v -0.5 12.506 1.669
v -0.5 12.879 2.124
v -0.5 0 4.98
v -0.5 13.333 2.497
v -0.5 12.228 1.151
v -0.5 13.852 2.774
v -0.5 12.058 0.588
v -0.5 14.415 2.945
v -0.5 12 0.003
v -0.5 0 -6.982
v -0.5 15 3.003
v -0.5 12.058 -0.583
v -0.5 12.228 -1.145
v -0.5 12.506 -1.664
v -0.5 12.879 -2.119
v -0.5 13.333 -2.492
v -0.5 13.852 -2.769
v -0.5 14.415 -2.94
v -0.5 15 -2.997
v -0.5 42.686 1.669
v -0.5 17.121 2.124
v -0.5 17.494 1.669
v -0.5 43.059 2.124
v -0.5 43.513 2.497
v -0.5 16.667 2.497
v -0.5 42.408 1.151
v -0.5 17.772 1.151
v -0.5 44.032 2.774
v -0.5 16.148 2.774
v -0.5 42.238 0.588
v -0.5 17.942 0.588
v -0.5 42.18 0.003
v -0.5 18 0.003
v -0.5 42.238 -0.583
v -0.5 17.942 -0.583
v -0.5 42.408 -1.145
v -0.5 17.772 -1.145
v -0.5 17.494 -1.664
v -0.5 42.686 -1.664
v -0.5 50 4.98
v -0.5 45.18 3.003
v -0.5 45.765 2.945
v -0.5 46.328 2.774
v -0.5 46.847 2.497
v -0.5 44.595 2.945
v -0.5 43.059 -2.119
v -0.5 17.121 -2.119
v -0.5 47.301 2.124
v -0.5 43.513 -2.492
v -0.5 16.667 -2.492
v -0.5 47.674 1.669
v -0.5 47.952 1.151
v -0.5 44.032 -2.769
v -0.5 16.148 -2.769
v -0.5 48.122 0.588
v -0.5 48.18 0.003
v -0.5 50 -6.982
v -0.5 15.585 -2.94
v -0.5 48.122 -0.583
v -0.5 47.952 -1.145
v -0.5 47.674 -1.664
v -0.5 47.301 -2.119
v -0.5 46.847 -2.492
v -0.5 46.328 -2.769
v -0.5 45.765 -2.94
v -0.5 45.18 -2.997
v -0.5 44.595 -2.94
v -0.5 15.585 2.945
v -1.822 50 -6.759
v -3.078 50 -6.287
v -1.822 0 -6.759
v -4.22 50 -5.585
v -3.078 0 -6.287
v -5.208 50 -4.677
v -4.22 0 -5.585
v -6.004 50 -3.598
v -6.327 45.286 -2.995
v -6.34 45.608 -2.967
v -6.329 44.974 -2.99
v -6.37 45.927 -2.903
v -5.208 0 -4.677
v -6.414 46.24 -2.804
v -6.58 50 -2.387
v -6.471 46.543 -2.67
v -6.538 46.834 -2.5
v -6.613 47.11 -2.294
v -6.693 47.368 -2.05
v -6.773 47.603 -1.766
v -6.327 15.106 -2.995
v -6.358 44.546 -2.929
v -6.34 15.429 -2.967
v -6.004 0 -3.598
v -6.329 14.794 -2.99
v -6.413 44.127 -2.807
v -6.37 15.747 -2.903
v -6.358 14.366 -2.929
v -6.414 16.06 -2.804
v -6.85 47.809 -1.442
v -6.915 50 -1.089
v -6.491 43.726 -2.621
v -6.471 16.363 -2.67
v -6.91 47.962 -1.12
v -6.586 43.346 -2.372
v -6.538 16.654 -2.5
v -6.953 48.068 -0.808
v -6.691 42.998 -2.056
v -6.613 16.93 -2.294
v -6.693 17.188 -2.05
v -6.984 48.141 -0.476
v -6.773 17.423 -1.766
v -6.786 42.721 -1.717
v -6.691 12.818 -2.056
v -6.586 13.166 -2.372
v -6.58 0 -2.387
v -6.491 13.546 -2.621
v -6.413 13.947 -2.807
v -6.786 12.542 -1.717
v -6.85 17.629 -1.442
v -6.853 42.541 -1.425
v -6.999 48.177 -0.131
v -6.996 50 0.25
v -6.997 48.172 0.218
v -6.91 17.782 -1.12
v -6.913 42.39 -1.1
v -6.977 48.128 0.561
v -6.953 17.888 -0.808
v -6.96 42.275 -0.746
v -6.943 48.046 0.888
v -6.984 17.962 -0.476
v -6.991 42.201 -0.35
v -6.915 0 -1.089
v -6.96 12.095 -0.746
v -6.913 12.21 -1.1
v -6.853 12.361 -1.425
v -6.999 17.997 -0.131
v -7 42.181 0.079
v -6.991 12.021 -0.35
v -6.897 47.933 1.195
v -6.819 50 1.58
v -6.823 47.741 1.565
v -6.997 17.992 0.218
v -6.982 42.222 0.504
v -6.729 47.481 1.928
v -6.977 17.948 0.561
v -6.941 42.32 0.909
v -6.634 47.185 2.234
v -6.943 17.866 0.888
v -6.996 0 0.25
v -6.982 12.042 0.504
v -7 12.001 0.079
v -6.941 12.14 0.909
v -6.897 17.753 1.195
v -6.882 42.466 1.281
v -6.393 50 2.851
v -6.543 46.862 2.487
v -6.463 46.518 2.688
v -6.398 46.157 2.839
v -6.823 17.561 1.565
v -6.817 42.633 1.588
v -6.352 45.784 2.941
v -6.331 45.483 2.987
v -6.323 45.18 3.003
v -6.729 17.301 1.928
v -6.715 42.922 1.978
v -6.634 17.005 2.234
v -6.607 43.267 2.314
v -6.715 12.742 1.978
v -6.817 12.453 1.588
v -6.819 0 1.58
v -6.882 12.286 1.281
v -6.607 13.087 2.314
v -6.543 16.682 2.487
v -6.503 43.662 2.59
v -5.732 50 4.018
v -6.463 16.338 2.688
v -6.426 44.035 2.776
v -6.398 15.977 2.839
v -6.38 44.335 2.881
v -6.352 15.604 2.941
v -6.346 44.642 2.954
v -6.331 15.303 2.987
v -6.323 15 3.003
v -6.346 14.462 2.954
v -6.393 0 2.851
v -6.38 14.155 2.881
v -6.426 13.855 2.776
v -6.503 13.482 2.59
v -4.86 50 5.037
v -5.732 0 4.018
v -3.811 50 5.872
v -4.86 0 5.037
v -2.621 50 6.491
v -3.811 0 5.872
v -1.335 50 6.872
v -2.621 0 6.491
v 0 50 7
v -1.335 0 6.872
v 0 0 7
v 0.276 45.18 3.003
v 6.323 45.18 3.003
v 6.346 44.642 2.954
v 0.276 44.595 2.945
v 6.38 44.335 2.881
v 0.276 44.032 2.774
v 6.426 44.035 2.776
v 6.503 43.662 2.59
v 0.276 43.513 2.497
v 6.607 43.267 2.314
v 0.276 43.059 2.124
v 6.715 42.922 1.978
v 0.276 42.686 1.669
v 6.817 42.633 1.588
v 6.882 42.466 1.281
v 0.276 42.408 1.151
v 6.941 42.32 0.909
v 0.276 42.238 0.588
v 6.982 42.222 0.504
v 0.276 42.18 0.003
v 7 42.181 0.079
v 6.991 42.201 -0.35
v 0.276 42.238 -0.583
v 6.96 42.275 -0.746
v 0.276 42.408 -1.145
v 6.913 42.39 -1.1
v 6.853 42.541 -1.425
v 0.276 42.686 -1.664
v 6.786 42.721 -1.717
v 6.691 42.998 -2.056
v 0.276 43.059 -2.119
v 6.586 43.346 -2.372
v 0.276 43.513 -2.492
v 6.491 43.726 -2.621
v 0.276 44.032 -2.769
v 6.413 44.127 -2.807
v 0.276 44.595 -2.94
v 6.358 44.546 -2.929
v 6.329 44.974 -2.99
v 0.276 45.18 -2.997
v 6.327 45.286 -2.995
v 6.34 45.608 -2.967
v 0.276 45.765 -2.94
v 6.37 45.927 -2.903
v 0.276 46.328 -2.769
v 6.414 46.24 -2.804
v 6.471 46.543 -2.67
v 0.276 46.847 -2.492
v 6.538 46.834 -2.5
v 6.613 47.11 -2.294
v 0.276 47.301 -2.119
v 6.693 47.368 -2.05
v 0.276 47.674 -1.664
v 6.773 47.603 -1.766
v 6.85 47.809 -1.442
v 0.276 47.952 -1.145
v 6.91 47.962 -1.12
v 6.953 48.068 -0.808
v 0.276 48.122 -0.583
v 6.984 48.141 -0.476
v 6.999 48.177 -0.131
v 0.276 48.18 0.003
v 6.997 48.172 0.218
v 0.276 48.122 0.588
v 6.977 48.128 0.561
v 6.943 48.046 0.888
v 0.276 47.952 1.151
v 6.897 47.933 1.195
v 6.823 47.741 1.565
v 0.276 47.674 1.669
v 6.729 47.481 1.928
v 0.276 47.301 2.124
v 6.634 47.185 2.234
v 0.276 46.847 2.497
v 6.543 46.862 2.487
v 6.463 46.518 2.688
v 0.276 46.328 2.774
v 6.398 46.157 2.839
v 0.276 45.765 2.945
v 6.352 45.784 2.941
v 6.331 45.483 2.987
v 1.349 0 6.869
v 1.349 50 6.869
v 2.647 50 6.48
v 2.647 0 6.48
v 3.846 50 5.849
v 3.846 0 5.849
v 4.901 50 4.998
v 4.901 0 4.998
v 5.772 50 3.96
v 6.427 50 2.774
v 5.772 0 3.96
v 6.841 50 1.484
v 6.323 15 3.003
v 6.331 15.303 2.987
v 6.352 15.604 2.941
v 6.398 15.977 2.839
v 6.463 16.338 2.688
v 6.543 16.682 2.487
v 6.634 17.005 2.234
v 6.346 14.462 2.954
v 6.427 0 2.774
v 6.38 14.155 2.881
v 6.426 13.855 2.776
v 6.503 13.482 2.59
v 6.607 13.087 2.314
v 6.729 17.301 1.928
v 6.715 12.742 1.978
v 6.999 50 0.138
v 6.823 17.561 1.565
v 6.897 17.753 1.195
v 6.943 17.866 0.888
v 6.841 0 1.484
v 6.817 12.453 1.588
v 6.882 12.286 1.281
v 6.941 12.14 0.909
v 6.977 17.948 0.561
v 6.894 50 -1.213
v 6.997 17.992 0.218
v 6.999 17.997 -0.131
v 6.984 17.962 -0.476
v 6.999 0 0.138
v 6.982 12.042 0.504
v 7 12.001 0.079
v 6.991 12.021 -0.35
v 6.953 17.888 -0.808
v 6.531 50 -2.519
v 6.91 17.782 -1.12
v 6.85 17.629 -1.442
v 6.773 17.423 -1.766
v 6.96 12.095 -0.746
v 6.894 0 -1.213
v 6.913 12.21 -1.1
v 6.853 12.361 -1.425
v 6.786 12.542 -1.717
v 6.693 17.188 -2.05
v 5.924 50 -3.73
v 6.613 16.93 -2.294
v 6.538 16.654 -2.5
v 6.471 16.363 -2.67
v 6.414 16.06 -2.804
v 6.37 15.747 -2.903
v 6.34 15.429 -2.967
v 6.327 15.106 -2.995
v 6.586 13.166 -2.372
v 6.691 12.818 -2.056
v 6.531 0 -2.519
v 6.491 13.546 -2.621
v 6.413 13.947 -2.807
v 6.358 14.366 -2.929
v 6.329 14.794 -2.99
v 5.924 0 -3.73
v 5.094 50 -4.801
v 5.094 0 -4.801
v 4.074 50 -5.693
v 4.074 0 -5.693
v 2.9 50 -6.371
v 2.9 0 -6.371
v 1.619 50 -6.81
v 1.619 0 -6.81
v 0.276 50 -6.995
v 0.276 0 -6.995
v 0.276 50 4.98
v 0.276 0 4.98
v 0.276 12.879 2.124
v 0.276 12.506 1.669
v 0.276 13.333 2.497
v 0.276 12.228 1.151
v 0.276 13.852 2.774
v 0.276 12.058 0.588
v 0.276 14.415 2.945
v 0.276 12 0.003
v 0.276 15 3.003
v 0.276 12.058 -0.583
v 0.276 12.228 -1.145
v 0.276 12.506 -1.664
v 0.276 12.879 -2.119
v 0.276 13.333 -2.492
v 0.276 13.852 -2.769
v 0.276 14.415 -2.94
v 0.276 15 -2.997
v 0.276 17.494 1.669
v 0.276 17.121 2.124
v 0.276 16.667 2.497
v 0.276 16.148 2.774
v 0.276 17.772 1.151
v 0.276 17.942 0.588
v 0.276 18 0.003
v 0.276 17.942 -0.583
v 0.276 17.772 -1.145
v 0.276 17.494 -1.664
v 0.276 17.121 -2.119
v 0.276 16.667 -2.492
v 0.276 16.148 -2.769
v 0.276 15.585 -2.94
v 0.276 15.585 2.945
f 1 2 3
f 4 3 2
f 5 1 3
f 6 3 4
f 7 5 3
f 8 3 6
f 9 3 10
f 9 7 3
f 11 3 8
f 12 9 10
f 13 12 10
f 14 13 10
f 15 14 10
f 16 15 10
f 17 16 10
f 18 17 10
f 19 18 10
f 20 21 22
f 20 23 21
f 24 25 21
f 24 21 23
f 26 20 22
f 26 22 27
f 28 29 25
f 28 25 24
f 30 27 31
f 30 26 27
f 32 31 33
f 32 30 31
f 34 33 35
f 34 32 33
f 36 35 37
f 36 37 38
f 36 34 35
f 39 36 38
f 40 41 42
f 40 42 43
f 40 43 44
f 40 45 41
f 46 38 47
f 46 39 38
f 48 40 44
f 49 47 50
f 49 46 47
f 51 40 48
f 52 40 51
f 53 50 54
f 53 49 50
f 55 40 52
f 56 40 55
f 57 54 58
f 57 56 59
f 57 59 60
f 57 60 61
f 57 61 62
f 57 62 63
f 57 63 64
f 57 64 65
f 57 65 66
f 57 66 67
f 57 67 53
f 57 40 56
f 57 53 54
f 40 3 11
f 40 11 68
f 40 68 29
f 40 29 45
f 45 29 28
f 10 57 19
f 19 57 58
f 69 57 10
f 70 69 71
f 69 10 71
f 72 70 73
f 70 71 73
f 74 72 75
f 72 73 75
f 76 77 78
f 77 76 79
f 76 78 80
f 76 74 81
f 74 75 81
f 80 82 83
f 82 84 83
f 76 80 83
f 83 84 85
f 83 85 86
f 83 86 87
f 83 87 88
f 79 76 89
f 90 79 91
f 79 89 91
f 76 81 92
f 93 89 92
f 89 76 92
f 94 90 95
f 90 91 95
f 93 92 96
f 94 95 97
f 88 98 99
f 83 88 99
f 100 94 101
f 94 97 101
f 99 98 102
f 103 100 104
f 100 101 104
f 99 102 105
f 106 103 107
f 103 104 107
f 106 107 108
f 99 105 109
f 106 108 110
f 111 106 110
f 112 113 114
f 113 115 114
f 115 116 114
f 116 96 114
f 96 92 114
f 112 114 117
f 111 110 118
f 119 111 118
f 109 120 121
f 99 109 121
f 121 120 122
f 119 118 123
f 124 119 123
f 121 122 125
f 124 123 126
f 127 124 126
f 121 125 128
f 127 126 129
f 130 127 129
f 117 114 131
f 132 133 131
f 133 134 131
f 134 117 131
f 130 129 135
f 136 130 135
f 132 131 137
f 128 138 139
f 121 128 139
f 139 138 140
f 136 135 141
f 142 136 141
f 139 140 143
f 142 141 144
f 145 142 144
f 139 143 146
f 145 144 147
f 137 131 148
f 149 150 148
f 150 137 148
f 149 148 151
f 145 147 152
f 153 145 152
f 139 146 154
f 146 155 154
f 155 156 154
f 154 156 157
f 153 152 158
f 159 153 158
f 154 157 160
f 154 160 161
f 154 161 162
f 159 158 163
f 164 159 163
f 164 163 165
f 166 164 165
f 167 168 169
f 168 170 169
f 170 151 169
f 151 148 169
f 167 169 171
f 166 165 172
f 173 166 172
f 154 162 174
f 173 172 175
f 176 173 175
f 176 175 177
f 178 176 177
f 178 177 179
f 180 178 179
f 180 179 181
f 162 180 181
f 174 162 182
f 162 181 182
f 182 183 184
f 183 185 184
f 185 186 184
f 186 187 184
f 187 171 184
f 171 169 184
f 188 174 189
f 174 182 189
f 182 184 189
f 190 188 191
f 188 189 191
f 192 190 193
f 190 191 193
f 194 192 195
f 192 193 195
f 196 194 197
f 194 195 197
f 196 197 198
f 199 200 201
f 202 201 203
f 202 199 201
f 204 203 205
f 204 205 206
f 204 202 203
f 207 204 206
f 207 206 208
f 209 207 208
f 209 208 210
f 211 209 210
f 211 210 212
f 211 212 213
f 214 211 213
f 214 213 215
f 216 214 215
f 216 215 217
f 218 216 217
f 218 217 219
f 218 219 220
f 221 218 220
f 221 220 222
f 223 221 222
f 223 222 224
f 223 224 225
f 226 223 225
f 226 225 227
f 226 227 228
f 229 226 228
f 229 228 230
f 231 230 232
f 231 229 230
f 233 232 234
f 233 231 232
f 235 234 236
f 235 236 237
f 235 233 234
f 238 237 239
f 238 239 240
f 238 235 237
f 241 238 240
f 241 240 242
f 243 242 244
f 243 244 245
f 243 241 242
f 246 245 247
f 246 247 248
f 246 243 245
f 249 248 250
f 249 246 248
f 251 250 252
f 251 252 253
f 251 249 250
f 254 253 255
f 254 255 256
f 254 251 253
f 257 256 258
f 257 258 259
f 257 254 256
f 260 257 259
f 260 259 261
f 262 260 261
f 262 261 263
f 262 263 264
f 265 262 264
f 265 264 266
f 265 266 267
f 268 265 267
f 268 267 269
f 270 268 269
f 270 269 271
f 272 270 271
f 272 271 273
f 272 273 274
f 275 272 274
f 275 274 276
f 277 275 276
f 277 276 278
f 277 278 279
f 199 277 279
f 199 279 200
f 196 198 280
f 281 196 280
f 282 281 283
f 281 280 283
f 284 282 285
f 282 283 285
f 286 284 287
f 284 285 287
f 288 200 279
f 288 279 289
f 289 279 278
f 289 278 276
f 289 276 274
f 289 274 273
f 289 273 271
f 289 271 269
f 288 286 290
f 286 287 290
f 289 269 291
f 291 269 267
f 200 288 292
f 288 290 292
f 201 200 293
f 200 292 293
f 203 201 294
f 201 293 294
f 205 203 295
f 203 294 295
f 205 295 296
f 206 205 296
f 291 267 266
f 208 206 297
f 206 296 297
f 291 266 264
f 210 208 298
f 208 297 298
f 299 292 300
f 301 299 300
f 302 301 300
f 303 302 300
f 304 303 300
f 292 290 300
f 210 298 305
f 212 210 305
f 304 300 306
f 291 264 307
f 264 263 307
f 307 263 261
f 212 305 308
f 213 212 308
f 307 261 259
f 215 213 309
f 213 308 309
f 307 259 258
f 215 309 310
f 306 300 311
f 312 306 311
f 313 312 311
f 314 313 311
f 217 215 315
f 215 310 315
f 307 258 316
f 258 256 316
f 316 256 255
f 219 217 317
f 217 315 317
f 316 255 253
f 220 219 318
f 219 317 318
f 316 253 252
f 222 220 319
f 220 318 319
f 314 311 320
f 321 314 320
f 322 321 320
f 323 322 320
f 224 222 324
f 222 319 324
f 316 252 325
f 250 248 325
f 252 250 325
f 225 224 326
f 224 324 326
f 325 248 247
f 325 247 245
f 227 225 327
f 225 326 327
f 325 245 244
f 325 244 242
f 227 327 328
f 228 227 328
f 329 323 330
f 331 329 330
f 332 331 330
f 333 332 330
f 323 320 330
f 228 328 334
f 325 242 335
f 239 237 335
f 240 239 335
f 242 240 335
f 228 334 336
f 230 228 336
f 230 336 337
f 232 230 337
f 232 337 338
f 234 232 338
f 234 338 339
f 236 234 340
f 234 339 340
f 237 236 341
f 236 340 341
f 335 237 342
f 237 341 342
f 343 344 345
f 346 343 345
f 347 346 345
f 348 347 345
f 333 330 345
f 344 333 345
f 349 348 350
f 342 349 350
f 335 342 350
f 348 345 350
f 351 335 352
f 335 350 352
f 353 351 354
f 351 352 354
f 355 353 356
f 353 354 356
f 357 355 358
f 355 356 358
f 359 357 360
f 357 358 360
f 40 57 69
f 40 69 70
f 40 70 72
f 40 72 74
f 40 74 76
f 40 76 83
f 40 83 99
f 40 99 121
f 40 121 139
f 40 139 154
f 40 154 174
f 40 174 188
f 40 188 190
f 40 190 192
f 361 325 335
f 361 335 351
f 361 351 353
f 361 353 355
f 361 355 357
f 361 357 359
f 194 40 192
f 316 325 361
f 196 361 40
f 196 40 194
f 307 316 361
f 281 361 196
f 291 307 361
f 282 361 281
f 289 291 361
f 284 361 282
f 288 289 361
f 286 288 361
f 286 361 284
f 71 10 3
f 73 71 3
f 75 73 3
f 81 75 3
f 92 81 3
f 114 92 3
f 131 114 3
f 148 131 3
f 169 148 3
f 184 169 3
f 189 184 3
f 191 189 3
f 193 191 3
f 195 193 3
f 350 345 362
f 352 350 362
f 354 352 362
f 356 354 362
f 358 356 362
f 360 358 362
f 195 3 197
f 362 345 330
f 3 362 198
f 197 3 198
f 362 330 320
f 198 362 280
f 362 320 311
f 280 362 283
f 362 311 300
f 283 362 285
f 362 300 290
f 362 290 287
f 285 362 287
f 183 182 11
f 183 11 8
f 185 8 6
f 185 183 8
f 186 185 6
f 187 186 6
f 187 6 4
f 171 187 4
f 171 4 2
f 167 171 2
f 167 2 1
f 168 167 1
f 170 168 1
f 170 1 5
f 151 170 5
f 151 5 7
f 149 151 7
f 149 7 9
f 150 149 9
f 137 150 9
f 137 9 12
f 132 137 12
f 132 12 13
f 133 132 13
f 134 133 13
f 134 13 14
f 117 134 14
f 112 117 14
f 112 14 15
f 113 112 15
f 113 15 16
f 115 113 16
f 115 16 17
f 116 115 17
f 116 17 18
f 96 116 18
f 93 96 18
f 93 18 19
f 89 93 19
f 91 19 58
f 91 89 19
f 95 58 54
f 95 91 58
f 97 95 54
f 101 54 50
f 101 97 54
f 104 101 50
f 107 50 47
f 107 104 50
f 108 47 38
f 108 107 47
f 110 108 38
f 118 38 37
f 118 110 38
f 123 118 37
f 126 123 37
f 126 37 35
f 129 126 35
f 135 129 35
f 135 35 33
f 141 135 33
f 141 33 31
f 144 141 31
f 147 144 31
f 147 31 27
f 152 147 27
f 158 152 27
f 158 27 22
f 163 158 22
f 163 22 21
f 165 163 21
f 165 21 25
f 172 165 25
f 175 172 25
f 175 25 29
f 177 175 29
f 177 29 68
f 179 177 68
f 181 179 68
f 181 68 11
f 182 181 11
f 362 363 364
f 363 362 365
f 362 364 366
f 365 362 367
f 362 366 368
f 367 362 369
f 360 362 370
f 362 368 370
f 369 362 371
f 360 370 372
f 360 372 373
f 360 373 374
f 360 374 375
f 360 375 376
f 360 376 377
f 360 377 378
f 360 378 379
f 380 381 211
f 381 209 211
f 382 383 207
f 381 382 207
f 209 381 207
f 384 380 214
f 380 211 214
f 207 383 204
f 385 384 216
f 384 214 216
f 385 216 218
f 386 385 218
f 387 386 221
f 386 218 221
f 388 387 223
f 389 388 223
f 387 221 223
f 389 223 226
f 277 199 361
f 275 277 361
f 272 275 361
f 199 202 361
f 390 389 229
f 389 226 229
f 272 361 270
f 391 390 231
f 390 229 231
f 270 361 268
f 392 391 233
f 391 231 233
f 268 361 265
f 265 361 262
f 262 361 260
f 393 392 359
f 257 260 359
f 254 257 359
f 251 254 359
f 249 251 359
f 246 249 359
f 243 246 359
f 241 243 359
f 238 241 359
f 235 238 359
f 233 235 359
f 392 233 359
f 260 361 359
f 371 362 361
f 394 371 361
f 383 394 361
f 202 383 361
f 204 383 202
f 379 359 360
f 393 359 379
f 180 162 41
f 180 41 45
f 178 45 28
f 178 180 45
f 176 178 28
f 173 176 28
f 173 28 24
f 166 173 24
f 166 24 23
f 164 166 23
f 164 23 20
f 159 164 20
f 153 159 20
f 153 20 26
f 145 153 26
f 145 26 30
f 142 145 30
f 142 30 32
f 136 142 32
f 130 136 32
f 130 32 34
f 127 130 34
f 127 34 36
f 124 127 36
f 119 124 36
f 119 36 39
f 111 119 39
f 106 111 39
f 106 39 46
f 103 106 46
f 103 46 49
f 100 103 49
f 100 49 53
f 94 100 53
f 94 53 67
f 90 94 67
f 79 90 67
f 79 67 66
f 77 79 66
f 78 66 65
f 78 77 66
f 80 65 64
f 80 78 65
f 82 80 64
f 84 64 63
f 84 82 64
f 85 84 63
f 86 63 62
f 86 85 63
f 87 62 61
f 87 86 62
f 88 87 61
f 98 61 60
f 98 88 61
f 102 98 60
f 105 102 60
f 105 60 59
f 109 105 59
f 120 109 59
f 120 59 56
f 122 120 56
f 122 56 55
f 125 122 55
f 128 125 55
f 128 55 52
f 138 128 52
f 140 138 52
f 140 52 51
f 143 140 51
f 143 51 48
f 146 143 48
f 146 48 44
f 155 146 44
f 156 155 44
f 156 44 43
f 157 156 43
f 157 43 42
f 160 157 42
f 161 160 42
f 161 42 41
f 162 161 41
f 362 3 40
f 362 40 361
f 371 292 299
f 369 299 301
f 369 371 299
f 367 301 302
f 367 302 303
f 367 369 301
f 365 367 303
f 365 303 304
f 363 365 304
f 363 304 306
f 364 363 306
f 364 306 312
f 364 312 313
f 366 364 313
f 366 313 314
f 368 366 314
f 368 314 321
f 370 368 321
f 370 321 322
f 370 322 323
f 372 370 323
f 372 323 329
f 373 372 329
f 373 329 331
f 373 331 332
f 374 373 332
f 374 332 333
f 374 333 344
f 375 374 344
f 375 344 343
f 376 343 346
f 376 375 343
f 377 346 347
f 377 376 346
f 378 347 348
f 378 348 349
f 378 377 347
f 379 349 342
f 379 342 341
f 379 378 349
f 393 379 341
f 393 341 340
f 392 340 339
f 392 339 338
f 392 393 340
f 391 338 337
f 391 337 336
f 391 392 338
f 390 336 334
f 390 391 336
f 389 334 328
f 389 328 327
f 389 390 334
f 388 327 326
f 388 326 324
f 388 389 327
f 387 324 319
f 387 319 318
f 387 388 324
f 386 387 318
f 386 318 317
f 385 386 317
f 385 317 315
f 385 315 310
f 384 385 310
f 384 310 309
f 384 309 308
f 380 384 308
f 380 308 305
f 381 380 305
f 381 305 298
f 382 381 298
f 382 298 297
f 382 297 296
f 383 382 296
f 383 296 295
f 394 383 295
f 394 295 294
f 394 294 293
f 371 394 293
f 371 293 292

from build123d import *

# Parameters (mm, degrees)
SKETCH1_R               = 7
BOSS_EXTRUDE1_DEPTH     = 50
SKETCH2_W               = 0.776080751
SKETCH2_H               = 12.3835138
CUT_EXTRUDE1_DEPTH      = 100
CUT_EXTRUDE2_DEPTH      = 40
CUT_EXTRUDE2_DEPTH_BACK = 40
SKETCH3_R               = 3


with BuildPart() as part:
    # Sketch1 → Boss-Extrude1 (new body)
    with BuildSketch(Plane(origin=(0, 0, 0), x_dir=(1, 0, 0), z_dir=(0, 1, 0))):
        with Locations(Location((0, 0, 0), (0, 0, 270))):
            Circle(SKETCH1_R)
    extrude(amount=BOSS_EXTRUDE1_DEPTH)

    # Sketch2 → Cut-Extrude1 (cut)
    with BuildSketch(Plane(origin=(0, 50, 0), x_dir=(1, 0, 0), z_dir=(0, 1, 0))):
        with Locations((-0.111959624, 1.211880607)):
            Rectangle(SKETCH2_W, SKETCH2_H)
    extrude(amount=-CUT_EXTRUDE1_DEPTH, mode=Mode.SUBTRACT)

    # Sketch3 → Cut-Extrude2 (cut, two sides: drawn at the far end of the back side and taken through both)
    with BuildSketch(Plane(origin=(0, 0, 0), x_dir=(0, 0, -1), z_dir=(1, 0, 0)).offset(-CUT_EXTRUDE2_DEPTH_BACK)):
        with Locations(Location((-0.002723223, 15, 0), (0, 0, 180))):
            Circle(SKETCH3_R)
        with Locations(Location((-0.002723223, 45.179912014, 0), (0, 0, 180))):
            Circle(SKETCH3_R)
    extrude(amount=CUT_EXTRUDE2_DEPTH + CUT_EXTRUDE2_DEPTH_BACK, mode=Mode.SUBTRACT)


solid = part.part
